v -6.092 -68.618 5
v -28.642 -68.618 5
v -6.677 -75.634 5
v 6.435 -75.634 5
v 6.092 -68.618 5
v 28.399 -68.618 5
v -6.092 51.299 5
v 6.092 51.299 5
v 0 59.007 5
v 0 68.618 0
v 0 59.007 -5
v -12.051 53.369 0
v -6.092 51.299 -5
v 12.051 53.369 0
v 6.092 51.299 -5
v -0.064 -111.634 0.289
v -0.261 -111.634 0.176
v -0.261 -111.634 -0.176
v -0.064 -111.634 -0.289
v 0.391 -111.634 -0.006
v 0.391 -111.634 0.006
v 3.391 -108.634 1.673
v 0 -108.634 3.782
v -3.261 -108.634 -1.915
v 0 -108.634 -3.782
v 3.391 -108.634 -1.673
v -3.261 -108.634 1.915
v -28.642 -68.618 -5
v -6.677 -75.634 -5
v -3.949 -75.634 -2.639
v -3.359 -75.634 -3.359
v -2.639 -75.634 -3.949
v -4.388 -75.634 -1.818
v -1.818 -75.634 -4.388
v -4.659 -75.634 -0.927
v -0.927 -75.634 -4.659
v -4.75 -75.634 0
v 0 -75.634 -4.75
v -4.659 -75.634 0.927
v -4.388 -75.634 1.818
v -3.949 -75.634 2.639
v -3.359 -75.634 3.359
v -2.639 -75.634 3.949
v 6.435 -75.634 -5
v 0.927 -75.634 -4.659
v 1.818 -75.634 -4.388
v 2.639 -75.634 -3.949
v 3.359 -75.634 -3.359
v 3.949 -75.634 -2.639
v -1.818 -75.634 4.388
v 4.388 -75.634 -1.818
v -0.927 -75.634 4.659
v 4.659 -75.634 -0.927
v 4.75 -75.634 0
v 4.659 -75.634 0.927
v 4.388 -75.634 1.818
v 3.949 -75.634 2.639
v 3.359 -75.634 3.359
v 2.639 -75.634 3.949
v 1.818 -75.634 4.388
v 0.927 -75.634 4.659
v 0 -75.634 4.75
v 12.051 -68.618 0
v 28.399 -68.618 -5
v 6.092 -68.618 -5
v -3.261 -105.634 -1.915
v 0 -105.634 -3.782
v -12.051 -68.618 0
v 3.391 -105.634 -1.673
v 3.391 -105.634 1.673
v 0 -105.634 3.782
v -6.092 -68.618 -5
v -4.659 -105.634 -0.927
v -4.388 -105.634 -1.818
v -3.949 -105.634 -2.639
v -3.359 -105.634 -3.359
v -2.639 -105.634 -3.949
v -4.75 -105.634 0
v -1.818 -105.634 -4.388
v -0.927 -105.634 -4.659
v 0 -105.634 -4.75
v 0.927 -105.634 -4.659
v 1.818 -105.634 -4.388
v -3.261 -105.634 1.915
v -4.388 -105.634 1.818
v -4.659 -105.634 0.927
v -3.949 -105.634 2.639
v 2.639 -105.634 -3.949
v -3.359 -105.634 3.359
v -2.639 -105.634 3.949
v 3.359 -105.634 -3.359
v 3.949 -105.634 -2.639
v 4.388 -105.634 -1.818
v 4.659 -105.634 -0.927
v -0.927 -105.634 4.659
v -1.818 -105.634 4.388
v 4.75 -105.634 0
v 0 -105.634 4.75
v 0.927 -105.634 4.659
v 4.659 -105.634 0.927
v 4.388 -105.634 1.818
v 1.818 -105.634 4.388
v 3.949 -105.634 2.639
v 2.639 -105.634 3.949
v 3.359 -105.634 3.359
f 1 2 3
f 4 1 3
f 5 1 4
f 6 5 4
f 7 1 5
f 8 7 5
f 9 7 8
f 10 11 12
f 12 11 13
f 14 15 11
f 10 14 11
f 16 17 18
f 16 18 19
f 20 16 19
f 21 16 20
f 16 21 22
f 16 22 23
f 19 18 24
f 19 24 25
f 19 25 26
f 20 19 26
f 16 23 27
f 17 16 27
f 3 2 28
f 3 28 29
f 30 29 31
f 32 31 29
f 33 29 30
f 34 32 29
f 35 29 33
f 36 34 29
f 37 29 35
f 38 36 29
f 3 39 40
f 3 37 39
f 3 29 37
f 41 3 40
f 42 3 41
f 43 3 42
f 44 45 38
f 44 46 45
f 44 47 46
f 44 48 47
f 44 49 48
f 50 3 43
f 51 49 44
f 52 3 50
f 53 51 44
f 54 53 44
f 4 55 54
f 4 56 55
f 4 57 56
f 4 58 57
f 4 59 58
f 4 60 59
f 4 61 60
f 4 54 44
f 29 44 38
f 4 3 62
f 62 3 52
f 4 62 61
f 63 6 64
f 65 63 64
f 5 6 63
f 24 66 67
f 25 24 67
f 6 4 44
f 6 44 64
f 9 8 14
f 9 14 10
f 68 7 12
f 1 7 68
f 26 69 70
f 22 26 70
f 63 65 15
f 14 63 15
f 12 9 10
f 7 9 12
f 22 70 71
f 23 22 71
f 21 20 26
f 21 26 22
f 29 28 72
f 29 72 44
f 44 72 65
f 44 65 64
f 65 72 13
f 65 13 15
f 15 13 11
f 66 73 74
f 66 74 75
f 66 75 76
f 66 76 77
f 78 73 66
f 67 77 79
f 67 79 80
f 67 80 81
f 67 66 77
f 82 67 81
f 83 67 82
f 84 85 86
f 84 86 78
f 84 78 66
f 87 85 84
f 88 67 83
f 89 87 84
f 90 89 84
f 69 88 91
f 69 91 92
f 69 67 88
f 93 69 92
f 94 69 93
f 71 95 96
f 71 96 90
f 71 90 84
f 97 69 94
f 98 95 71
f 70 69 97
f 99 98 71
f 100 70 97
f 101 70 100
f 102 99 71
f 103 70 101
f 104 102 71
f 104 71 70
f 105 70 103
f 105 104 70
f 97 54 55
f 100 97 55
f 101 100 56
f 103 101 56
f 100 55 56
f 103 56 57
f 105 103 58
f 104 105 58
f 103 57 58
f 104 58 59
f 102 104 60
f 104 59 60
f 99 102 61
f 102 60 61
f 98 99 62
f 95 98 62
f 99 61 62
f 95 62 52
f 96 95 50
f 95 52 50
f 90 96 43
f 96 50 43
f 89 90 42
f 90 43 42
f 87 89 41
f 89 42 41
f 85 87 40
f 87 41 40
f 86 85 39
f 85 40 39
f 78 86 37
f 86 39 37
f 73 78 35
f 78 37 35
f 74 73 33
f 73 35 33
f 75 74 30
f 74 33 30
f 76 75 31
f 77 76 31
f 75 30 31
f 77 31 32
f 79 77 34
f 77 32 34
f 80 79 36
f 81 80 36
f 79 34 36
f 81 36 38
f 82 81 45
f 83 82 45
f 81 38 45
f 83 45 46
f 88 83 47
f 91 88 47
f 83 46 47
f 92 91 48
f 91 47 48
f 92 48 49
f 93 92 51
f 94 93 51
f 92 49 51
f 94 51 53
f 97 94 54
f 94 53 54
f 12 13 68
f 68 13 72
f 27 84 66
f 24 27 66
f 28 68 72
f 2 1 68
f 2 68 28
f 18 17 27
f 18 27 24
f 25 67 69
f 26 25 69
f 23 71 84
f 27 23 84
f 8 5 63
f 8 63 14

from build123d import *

# Parameters (mm, degrees)
F1_DEPTH = 5
F2_SIZE2 = 5.958758
F2_SIZE  = 4.99999
F4_R     = 4.75
F5_DEPTH = 30
F7_DEPTH = 6
F8_SIZE2 = 3
F8_SIZE  = 3


# Not quite as in the source:
# - a fillet or chamfer is up to 0.001 mm smaller than in the source, because OpenCascade refuses the exact size


with BuildPart() as f1:
    # F0 (on Top) → F1 (new body)
    with BuildSketch(Plane.XY):
        Polygon((-12.0511064306, 53.3692054451), (-12.0511064306, -68.6175450683), (12.0511064306, -68.6175450683), (12.0511064306, 53.3692054451), (0, 68.6175450683), align=None)
        Polygon((12.0511064306, -68.6175450683), (-12.0511064306, -68.6175450683), (-28.6420956254, -68.6175450683), (-6.6773975268, -75.6341889501), (6.4345644787, -75.6341889501), (28.3992625773, -68.6175450683), align=None)
    extrude(amount=F1_DEPTH)

    # F2 (size 5 and 5.958767963 in the source; OpenCascade refuses exactly that, so slightly less here)
    f2_edges = [f1.edges().sort_by_distance(p)[0] for p in [
        (12.051106, -7.62417, 5),
        (6.025553, 60.993375, 5),
        (-6.025553, 60.993375, 5),
        (-12.051106, -7.62417, 5),
    ]]
    chamfer(f2_edges, length=F2_SIZE, length2=F2_SIZE2)

    # F3: F1 across plane


with BuildPart() as f1_1:
    add(f1.part)
    add(f1.part.mirror(Plane.XY))

    # F4 (on face) → F5 (join)
    with BuildSketch(Plane.XZ.offset(75.6341889501)):
        Circle(F4_R)
    extrude(amount=F5_DEPTH)

    # F6 (on face) → F7 (join)
    with BuildSketch(Plane.XZ.offset(105.6341889501)):
        Polygon((3.3913787161, 1.6732233375), (0, 3.7816829499), (-3.2607477523, 1.9153720341), (-3.2607477523, -1.9153720341), (0, -3.7816829499), (3.3913787161, -1.6732233375), align=None)
    extrude(amount=F7_DEPTH)

    # F8
    f8_edges = [f1_1.edges().sort_by_distance(p)[0] for p in [
        (-1.630374, -111.634189, 2.848527),
        (1.695689, -111.634189, 2.727453),
        (-3.260748, -111.634189, 0),
        (-1.630374, -111.634189, -2.848527),
        (1.695689, -111.634189, -2.727453),
        (3.391379, -111.634189, 0),
    ]]
    chamfer(f8_edges, length=F8_SIZE, length2=F8_SIZE2)


solid = f1_1.part
